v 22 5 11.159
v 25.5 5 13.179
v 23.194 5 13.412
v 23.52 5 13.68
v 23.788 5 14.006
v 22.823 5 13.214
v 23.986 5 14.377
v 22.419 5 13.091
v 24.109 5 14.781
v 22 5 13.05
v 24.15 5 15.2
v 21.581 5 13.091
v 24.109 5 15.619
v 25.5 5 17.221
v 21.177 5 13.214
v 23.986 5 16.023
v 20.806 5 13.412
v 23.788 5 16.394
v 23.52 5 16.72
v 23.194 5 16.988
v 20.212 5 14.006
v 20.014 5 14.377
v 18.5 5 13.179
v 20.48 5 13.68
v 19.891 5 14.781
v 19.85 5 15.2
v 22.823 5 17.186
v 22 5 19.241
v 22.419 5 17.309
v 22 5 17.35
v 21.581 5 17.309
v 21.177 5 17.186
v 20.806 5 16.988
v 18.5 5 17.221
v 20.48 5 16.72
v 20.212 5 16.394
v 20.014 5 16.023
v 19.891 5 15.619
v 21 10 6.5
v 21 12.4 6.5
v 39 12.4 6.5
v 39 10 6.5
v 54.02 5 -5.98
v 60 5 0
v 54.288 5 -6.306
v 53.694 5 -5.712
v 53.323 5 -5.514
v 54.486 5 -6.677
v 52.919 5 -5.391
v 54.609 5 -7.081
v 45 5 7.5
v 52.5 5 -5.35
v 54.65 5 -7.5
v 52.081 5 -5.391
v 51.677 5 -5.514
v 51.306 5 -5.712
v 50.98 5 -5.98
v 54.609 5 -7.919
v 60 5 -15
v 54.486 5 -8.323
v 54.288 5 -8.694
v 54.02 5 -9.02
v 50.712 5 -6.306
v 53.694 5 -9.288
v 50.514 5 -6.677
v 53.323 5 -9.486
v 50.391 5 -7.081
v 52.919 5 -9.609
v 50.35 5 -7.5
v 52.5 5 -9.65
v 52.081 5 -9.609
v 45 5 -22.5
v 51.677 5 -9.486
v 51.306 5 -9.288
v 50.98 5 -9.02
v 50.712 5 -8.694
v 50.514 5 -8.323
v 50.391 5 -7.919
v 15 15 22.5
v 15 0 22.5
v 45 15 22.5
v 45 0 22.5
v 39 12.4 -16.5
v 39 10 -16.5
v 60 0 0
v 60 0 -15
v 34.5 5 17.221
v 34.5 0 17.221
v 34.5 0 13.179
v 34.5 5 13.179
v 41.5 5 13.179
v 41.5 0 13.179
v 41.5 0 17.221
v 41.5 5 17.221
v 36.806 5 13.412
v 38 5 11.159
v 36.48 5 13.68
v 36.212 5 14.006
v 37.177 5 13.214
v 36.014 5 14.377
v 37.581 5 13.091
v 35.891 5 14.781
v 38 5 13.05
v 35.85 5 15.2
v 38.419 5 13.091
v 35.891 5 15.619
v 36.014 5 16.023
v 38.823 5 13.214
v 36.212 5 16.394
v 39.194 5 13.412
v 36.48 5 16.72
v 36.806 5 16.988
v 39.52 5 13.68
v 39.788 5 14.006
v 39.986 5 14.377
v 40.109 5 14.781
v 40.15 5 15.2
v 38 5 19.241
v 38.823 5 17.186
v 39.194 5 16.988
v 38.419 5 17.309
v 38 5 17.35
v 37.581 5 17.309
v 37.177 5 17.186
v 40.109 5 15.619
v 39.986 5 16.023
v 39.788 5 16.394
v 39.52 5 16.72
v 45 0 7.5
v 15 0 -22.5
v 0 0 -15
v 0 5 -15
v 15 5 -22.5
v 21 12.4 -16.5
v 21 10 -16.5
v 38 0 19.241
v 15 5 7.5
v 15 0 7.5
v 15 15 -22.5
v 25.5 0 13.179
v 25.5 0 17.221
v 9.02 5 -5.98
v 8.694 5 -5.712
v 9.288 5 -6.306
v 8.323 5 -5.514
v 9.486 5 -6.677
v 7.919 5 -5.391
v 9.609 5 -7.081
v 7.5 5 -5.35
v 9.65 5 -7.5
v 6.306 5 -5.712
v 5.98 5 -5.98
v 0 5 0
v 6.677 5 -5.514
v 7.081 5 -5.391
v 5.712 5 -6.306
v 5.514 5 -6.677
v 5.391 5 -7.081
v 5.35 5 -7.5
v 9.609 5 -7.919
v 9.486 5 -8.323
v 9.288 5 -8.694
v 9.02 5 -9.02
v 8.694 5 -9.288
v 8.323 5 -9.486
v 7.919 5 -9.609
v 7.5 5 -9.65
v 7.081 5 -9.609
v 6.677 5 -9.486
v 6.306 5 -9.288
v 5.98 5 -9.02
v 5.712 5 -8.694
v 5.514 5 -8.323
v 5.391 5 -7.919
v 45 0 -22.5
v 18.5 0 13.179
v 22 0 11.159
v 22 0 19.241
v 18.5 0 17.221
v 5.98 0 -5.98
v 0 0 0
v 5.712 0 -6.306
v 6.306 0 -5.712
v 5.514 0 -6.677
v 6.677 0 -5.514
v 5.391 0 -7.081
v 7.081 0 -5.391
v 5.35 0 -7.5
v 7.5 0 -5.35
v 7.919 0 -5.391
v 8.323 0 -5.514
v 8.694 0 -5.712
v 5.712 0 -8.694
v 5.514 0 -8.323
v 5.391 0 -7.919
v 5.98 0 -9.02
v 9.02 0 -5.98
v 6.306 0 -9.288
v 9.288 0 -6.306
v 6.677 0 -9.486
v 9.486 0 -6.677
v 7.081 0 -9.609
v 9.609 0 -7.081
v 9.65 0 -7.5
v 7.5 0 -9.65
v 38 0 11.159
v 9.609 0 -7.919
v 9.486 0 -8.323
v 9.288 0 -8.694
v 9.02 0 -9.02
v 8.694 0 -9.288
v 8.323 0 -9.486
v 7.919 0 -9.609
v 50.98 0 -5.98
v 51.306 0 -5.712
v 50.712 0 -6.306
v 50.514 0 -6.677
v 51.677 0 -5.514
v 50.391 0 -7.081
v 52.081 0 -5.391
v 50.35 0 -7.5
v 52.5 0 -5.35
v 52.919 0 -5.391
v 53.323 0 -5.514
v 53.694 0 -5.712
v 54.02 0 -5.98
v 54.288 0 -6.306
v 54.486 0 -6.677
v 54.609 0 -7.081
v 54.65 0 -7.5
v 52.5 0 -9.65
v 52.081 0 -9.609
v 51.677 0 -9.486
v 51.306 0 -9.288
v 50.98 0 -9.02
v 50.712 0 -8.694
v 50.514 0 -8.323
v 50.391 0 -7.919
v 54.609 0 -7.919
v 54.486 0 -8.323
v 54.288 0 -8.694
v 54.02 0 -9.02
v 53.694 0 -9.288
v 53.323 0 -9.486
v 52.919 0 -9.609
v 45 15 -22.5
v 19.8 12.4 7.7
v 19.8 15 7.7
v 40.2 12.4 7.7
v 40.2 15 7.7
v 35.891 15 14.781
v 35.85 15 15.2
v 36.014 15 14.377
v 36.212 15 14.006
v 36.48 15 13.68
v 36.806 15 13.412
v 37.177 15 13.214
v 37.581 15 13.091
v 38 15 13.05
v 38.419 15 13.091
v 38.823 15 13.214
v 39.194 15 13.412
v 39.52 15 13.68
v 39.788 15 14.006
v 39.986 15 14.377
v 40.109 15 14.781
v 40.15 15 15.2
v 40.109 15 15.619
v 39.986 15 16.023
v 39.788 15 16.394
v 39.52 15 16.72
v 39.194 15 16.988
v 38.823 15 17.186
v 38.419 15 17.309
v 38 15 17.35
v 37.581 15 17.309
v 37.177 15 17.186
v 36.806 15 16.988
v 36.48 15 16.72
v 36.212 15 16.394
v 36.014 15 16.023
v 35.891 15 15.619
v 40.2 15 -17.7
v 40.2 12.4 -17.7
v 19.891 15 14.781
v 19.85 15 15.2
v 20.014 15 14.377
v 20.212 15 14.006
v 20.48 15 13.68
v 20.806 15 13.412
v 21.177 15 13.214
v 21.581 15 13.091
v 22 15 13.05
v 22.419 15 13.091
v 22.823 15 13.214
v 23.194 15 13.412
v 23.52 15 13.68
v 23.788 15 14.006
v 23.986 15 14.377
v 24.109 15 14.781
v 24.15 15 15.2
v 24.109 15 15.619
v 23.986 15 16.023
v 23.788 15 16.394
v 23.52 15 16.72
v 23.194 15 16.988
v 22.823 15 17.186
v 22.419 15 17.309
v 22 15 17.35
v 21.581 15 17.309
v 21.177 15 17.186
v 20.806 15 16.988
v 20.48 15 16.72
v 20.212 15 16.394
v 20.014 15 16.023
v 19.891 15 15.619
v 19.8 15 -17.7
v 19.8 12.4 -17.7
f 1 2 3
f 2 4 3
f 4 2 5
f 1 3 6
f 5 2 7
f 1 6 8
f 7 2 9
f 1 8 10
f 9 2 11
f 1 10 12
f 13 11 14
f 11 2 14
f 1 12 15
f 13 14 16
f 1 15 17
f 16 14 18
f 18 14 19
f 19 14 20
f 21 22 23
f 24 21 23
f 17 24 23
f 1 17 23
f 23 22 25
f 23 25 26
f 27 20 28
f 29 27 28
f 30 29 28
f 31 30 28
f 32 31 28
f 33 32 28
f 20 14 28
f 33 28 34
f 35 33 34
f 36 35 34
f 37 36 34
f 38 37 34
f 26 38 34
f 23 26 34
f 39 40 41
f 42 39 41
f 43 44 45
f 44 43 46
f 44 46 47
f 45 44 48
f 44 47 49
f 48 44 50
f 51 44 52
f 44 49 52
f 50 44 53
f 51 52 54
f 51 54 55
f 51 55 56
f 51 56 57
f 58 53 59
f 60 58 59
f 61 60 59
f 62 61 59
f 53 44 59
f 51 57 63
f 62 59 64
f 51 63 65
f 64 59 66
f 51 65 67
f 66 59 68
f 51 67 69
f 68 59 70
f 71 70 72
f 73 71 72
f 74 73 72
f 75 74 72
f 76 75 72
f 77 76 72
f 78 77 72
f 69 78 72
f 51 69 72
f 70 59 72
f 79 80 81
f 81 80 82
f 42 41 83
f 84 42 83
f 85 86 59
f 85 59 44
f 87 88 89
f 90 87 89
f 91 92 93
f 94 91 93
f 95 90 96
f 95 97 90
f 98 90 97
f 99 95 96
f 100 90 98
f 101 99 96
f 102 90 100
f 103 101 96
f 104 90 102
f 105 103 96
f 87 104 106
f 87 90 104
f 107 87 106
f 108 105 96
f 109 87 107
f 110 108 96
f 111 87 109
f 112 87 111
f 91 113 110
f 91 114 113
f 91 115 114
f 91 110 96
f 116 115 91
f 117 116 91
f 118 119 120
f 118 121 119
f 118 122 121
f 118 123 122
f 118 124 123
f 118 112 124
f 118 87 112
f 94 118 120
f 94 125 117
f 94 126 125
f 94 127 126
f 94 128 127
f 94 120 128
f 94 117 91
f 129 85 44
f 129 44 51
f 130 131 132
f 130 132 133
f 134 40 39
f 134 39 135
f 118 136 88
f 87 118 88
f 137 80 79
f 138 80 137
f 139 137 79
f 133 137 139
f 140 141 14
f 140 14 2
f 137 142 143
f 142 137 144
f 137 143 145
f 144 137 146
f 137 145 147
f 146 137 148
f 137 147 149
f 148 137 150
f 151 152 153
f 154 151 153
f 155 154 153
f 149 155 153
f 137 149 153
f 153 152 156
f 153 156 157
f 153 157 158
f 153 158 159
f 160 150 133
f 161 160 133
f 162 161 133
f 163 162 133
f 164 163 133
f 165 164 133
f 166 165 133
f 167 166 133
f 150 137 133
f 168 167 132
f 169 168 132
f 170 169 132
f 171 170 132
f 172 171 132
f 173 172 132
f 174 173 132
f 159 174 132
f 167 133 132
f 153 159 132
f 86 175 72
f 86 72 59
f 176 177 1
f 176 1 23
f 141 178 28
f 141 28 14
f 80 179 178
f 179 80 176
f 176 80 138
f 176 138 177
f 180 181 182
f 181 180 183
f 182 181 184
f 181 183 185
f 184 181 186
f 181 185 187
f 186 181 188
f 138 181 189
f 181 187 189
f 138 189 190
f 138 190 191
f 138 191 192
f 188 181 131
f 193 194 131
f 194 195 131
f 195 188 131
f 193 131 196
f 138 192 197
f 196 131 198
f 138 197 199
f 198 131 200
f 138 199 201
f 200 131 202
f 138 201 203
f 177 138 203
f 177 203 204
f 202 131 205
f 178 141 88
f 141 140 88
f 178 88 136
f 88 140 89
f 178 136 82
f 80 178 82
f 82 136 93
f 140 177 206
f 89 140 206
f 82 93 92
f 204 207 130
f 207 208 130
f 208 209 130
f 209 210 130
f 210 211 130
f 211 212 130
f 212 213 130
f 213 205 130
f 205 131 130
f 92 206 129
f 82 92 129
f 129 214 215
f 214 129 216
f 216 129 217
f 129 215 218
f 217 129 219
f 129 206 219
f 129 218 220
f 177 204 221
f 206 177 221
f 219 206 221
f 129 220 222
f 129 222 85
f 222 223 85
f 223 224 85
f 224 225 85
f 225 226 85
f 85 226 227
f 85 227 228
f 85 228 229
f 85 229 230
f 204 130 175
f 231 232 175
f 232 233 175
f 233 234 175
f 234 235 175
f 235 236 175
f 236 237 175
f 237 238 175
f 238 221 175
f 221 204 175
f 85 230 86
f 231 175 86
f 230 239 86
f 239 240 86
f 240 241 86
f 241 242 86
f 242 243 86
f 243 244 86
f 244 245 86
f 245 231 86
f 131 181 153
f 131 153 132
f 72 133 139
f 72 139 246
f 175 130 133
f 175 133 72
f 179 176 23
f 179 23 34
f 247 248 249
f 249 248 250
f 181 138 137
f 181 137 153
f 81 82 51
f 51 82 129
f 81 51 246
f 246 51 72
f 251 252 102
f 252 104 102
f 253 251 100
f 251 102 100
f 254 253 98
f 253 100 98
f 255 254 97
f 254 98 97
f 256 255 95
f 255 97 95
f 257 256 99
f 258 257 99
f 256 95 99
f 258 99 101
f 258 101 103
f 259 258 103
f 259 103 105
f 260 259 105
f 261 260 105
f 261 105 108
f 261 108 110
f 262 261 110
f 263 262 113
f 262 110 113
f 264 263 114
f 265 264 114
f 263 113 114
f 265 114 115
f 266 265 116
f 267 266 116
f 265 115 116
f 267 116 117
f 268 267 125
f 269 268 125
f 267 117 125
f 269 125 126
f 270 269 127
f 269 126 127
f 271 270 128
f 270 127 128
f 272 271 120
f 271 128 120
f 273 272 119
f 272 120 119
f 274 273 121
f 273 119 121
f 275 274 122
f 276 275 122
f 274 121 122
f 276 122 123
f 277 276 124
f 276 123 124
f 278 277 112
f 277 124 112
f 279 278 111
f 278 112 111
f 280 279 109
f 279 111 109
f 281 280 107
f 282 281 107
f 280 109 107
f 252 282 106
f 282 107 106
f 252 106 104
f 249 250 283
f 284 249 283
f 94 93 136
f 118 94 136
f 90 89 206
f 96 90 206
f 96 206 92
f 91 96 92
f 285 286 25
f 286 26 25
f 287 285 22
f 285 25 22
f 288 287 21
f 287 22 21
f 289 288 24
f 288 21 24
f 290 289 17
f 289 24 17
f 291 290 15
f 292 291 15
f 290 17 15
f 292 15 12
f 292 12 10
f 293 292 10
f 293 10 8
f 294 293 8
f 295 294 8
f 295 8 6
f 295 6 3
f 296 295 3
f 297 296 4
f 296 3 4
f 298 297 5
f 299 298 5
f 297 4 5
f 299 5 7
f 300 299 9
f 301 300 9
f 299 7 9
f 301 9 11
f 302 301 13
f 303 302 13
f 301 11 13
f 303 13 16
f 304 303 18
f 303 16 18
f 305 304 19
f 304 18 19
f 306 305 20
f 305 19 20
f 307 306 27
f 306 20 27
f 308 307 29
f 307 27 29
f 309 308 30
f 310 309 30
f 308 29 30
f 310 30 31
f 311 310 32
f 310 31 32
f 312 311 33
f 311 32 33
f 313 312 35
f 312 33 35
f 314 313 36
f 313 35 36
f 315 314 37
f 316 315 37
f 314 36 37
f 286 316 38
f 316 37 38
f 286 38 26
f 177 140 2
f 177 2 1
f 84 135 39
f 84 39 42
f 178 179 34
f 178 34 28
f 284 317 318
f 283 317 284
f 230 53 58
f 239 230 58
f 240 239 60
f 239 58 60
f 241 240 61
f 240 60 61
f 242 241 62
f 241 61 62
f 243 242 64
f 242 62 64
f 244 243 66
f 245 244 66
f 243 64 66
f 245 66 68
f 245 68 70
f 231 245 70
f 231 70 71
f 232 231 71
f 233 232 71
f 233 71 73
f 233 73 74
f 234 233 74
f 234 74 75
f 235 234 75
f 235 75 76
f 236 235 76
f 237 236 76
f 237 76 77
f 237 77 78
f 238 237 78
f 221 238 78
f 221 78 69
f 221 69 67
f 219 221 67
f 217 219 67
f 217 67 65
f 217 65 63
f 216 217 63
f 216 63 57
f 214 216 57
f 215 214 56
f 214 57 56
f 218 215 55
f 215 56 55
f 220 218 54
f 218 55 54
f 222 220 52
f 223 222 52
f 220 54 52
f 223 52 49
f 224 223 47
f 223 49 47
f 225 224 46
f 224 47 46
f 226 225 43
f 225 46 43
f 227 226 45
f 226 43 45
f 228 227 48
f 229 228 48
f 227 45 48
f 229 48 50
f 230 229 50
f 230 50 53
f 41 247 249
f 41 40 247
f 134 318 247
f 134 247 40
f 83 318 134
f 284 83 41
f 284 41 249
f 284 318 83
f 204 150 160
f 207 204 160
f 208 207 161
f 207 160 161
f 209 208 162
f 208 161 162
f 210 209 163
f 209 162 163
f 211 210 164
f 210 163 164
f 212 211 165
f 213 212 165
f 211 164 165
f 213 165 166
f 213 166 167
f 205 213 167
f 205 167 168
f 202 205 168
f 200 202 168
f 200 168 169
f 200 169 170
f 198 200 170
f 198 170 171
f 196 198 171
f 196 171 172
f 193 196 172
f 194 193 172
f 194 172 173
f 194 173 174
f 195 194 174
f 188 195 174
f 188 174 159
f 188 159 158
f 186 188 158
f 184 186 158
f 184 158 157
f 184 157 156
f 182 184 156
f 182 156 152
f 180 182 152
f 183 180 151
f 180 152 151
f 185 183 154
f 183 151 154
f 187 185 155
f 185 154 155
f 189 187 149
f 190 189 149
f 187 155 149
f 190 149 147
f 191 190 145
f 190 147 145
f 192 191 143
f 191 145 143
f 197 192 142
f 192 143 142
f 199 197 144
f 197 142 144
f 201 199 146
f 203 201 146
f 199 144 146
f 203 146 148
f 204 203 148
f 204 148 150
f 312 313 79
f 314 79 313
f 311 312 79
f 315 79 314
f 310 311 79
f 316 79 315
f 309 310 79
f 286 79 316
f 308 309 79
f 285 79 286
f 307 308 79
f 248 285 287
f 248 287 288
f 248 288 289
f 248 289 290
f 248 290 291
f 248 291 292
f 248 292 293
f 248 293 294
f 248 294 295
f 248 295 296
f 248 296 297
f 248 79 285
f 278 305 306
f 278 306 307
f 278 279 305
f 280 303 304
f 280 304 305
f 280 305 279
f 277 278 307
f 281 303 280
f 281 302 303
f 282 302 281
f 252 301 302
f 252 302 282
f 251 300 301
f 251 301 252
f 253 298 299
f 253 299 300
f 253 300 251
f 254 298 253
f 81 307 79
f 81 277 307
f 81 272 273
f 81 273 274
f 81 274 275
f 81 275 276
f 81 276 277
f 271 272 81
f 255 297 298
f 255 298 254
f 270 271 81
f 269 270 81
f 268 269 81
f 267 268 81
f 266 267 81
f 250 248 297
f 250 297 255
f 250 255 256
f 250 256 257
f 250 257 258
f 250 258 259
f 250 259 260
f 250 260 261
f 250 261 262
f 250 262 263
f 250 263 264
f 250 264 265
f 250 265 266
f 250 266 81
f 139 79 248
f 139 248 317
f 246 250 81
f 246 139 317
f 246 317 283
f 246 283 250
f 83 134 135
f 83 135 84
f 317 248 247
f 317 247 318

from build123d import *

# Parameters (mm, degrees)
SKETCH1_W                = 30
SKETCH1_H                = 30
BOSS_EXTRUDE1_DEPTH      = 5
M4_CLEARANCE_HOLE1_D     = 4.3
M4_CLEARANCE_HOLE1_DEPTH = 5
SKETCH13_W               = 30
SKETCH13_H               = 45
BOSS_EXTRUDE7_DEPTH      = 15
SKETCH14_W               = 20.4
SKETCH14_H               = 25.4
CUT_EXTRUDE2_DEPTH       = 5
BOSS_EXTRUDE8_REACH      = 19.6
BOSS_EXTRUDE8_START      = -2.6
SKETCH15_W               = 20.4
SKETCH15_H               = 25.4
SKETCH15_W_2             = 18
SKETCH15_H_2             = 23
M4_CLEARANCE_HOLE2_D     = 4.3
M4_CLEARANCE_HOLE2_DEPTH = 15
CUT_EXTRUDE1_DEPTH       = 5


with BuildPart() as part:
    # Sketch1 → Boss-Extrude1 (new body)
    with BuildSketch(Plane(origin=(0, 0, 0), x_dir=(1, 0, 0), z_dir=(0, 1, 0))):
        Polygon((15, 22.5), (15, -7.5), (0, 0), (0, 15), align=None)
        with Locations((30, 7.5)):
            Rectangle(SKETCH1_W, SKETCH1_H)
        Polygon((45, -7.5), (45, 22.5), (60, 15), (60, 0), align=None)
    extrude(amount=BOSS_EXTRUDE1_DEPTH)

    # M4 Clearance Hole1
    with Locations(Plane(origin=(0, 0, 0), x_dir=(-1, 0, 0), z_dir=(0, -1, 0))):
        with Locations((-7.5, 7.5), (-52.5, 7.5)):
            Hole(M4_CLEARANCE_HOLE1_D / 2, depth=M4_CLEARANCE_HOLE1_DEPTH)

    # Sketch13 → Boss-Extrude7 (add)
    with BuildSketch(Plane(origin=(0, 0, 0), x_dir=(1, 0, 0), z_dir=(0, 1, 0))):
        with Locations((30, 0)):
            Rectangle(SKETCH13_W, SKETCH13_H)
    extrude(amount=BOSS_EXTRUDE7_DEPTH)

    # Sketch14 → Cut-Extrude2 (cut)
    with BuildSketch(Plane(origin=(0, 15, 0), x_dir=(1, 0, 0), z_dir=(0, 1, 0))):
        with Locations((30, 5)):
            Rectangle(SKETCH14_W, SKETCH14_H)
    extrude(amount=-CUT_EXTRUDE2_DEPTH, mode=Mode.SUBTRACT)

    # Sketch15 → Boss-Extrude8 (add, up to next)
    with BuildSketch(Plane(origin=(0, 15, 0), x_dir=(1, 0, 0), z_dir=(0, 1, 0)).offset(BOSS_EXTRUDE8_START), mode=Mode.PRIVATE) as boss_extrude8_sk1:
        with Locations((30, 5)):
            Rectangle(SKETCH15_W, SKETCH15_H)
        with Locations((30, 5)):
            Rectangle(SKETCH15_W_2, SKETCH15_H_2, mode=Mode.SUBTRACT)
    boss_extrude8_tool1 = extrude(boss_extrude8_sk1.sketch, amount=-BOSS_EXTRUDE8_REACH, mode=Mode.PRIVATE) - part.part
    add(boss_extrude8_tool1.solids().sort_by_distance((39.874221, 12.4, -5))[0])

    # M4 Clearance Hole2
    with Locations(Plane(origin=(0, 15, 0), x_dir=(1, 0, 0), z_dir=(0, 1, 0))):
        with Locations((22, -15.2), (38, -15.2)):
            Hole(M4_CLEARANCE_HOLE2_D / 2, depth=M4_CLEARANCE_HOLE2_DEPTH)

    # Sketch11 → Cut-Extrude1 (cut)
    with BuildSketch(Plane(origin=(0, 0, 0), x_dir=(-1, 0, 0), z_dir=(0, 1, 0))):
        Polygon((-22, 19.241451884), (-25.5, 17.220725942), (-25.5, 13.179274058), (-22, 11.158548116), (-18.5, 13.179274058), (-18.5, 17.220725942), align=None)
    cut_extrude1 = extrude(amount=CUT_EXTRUDE1_DEPTH, mode=Mode.SUBTRACT)

    # Mirror1: Cut-Extrude1 across plane
    add(cut_extrude1.mirror(Plane(origin=(30, 0, 0), x_dir=(0, 0, 1), z_dir=(1, 0, 0))), mode=Mode.SUBTRACT)


solid = part.part
